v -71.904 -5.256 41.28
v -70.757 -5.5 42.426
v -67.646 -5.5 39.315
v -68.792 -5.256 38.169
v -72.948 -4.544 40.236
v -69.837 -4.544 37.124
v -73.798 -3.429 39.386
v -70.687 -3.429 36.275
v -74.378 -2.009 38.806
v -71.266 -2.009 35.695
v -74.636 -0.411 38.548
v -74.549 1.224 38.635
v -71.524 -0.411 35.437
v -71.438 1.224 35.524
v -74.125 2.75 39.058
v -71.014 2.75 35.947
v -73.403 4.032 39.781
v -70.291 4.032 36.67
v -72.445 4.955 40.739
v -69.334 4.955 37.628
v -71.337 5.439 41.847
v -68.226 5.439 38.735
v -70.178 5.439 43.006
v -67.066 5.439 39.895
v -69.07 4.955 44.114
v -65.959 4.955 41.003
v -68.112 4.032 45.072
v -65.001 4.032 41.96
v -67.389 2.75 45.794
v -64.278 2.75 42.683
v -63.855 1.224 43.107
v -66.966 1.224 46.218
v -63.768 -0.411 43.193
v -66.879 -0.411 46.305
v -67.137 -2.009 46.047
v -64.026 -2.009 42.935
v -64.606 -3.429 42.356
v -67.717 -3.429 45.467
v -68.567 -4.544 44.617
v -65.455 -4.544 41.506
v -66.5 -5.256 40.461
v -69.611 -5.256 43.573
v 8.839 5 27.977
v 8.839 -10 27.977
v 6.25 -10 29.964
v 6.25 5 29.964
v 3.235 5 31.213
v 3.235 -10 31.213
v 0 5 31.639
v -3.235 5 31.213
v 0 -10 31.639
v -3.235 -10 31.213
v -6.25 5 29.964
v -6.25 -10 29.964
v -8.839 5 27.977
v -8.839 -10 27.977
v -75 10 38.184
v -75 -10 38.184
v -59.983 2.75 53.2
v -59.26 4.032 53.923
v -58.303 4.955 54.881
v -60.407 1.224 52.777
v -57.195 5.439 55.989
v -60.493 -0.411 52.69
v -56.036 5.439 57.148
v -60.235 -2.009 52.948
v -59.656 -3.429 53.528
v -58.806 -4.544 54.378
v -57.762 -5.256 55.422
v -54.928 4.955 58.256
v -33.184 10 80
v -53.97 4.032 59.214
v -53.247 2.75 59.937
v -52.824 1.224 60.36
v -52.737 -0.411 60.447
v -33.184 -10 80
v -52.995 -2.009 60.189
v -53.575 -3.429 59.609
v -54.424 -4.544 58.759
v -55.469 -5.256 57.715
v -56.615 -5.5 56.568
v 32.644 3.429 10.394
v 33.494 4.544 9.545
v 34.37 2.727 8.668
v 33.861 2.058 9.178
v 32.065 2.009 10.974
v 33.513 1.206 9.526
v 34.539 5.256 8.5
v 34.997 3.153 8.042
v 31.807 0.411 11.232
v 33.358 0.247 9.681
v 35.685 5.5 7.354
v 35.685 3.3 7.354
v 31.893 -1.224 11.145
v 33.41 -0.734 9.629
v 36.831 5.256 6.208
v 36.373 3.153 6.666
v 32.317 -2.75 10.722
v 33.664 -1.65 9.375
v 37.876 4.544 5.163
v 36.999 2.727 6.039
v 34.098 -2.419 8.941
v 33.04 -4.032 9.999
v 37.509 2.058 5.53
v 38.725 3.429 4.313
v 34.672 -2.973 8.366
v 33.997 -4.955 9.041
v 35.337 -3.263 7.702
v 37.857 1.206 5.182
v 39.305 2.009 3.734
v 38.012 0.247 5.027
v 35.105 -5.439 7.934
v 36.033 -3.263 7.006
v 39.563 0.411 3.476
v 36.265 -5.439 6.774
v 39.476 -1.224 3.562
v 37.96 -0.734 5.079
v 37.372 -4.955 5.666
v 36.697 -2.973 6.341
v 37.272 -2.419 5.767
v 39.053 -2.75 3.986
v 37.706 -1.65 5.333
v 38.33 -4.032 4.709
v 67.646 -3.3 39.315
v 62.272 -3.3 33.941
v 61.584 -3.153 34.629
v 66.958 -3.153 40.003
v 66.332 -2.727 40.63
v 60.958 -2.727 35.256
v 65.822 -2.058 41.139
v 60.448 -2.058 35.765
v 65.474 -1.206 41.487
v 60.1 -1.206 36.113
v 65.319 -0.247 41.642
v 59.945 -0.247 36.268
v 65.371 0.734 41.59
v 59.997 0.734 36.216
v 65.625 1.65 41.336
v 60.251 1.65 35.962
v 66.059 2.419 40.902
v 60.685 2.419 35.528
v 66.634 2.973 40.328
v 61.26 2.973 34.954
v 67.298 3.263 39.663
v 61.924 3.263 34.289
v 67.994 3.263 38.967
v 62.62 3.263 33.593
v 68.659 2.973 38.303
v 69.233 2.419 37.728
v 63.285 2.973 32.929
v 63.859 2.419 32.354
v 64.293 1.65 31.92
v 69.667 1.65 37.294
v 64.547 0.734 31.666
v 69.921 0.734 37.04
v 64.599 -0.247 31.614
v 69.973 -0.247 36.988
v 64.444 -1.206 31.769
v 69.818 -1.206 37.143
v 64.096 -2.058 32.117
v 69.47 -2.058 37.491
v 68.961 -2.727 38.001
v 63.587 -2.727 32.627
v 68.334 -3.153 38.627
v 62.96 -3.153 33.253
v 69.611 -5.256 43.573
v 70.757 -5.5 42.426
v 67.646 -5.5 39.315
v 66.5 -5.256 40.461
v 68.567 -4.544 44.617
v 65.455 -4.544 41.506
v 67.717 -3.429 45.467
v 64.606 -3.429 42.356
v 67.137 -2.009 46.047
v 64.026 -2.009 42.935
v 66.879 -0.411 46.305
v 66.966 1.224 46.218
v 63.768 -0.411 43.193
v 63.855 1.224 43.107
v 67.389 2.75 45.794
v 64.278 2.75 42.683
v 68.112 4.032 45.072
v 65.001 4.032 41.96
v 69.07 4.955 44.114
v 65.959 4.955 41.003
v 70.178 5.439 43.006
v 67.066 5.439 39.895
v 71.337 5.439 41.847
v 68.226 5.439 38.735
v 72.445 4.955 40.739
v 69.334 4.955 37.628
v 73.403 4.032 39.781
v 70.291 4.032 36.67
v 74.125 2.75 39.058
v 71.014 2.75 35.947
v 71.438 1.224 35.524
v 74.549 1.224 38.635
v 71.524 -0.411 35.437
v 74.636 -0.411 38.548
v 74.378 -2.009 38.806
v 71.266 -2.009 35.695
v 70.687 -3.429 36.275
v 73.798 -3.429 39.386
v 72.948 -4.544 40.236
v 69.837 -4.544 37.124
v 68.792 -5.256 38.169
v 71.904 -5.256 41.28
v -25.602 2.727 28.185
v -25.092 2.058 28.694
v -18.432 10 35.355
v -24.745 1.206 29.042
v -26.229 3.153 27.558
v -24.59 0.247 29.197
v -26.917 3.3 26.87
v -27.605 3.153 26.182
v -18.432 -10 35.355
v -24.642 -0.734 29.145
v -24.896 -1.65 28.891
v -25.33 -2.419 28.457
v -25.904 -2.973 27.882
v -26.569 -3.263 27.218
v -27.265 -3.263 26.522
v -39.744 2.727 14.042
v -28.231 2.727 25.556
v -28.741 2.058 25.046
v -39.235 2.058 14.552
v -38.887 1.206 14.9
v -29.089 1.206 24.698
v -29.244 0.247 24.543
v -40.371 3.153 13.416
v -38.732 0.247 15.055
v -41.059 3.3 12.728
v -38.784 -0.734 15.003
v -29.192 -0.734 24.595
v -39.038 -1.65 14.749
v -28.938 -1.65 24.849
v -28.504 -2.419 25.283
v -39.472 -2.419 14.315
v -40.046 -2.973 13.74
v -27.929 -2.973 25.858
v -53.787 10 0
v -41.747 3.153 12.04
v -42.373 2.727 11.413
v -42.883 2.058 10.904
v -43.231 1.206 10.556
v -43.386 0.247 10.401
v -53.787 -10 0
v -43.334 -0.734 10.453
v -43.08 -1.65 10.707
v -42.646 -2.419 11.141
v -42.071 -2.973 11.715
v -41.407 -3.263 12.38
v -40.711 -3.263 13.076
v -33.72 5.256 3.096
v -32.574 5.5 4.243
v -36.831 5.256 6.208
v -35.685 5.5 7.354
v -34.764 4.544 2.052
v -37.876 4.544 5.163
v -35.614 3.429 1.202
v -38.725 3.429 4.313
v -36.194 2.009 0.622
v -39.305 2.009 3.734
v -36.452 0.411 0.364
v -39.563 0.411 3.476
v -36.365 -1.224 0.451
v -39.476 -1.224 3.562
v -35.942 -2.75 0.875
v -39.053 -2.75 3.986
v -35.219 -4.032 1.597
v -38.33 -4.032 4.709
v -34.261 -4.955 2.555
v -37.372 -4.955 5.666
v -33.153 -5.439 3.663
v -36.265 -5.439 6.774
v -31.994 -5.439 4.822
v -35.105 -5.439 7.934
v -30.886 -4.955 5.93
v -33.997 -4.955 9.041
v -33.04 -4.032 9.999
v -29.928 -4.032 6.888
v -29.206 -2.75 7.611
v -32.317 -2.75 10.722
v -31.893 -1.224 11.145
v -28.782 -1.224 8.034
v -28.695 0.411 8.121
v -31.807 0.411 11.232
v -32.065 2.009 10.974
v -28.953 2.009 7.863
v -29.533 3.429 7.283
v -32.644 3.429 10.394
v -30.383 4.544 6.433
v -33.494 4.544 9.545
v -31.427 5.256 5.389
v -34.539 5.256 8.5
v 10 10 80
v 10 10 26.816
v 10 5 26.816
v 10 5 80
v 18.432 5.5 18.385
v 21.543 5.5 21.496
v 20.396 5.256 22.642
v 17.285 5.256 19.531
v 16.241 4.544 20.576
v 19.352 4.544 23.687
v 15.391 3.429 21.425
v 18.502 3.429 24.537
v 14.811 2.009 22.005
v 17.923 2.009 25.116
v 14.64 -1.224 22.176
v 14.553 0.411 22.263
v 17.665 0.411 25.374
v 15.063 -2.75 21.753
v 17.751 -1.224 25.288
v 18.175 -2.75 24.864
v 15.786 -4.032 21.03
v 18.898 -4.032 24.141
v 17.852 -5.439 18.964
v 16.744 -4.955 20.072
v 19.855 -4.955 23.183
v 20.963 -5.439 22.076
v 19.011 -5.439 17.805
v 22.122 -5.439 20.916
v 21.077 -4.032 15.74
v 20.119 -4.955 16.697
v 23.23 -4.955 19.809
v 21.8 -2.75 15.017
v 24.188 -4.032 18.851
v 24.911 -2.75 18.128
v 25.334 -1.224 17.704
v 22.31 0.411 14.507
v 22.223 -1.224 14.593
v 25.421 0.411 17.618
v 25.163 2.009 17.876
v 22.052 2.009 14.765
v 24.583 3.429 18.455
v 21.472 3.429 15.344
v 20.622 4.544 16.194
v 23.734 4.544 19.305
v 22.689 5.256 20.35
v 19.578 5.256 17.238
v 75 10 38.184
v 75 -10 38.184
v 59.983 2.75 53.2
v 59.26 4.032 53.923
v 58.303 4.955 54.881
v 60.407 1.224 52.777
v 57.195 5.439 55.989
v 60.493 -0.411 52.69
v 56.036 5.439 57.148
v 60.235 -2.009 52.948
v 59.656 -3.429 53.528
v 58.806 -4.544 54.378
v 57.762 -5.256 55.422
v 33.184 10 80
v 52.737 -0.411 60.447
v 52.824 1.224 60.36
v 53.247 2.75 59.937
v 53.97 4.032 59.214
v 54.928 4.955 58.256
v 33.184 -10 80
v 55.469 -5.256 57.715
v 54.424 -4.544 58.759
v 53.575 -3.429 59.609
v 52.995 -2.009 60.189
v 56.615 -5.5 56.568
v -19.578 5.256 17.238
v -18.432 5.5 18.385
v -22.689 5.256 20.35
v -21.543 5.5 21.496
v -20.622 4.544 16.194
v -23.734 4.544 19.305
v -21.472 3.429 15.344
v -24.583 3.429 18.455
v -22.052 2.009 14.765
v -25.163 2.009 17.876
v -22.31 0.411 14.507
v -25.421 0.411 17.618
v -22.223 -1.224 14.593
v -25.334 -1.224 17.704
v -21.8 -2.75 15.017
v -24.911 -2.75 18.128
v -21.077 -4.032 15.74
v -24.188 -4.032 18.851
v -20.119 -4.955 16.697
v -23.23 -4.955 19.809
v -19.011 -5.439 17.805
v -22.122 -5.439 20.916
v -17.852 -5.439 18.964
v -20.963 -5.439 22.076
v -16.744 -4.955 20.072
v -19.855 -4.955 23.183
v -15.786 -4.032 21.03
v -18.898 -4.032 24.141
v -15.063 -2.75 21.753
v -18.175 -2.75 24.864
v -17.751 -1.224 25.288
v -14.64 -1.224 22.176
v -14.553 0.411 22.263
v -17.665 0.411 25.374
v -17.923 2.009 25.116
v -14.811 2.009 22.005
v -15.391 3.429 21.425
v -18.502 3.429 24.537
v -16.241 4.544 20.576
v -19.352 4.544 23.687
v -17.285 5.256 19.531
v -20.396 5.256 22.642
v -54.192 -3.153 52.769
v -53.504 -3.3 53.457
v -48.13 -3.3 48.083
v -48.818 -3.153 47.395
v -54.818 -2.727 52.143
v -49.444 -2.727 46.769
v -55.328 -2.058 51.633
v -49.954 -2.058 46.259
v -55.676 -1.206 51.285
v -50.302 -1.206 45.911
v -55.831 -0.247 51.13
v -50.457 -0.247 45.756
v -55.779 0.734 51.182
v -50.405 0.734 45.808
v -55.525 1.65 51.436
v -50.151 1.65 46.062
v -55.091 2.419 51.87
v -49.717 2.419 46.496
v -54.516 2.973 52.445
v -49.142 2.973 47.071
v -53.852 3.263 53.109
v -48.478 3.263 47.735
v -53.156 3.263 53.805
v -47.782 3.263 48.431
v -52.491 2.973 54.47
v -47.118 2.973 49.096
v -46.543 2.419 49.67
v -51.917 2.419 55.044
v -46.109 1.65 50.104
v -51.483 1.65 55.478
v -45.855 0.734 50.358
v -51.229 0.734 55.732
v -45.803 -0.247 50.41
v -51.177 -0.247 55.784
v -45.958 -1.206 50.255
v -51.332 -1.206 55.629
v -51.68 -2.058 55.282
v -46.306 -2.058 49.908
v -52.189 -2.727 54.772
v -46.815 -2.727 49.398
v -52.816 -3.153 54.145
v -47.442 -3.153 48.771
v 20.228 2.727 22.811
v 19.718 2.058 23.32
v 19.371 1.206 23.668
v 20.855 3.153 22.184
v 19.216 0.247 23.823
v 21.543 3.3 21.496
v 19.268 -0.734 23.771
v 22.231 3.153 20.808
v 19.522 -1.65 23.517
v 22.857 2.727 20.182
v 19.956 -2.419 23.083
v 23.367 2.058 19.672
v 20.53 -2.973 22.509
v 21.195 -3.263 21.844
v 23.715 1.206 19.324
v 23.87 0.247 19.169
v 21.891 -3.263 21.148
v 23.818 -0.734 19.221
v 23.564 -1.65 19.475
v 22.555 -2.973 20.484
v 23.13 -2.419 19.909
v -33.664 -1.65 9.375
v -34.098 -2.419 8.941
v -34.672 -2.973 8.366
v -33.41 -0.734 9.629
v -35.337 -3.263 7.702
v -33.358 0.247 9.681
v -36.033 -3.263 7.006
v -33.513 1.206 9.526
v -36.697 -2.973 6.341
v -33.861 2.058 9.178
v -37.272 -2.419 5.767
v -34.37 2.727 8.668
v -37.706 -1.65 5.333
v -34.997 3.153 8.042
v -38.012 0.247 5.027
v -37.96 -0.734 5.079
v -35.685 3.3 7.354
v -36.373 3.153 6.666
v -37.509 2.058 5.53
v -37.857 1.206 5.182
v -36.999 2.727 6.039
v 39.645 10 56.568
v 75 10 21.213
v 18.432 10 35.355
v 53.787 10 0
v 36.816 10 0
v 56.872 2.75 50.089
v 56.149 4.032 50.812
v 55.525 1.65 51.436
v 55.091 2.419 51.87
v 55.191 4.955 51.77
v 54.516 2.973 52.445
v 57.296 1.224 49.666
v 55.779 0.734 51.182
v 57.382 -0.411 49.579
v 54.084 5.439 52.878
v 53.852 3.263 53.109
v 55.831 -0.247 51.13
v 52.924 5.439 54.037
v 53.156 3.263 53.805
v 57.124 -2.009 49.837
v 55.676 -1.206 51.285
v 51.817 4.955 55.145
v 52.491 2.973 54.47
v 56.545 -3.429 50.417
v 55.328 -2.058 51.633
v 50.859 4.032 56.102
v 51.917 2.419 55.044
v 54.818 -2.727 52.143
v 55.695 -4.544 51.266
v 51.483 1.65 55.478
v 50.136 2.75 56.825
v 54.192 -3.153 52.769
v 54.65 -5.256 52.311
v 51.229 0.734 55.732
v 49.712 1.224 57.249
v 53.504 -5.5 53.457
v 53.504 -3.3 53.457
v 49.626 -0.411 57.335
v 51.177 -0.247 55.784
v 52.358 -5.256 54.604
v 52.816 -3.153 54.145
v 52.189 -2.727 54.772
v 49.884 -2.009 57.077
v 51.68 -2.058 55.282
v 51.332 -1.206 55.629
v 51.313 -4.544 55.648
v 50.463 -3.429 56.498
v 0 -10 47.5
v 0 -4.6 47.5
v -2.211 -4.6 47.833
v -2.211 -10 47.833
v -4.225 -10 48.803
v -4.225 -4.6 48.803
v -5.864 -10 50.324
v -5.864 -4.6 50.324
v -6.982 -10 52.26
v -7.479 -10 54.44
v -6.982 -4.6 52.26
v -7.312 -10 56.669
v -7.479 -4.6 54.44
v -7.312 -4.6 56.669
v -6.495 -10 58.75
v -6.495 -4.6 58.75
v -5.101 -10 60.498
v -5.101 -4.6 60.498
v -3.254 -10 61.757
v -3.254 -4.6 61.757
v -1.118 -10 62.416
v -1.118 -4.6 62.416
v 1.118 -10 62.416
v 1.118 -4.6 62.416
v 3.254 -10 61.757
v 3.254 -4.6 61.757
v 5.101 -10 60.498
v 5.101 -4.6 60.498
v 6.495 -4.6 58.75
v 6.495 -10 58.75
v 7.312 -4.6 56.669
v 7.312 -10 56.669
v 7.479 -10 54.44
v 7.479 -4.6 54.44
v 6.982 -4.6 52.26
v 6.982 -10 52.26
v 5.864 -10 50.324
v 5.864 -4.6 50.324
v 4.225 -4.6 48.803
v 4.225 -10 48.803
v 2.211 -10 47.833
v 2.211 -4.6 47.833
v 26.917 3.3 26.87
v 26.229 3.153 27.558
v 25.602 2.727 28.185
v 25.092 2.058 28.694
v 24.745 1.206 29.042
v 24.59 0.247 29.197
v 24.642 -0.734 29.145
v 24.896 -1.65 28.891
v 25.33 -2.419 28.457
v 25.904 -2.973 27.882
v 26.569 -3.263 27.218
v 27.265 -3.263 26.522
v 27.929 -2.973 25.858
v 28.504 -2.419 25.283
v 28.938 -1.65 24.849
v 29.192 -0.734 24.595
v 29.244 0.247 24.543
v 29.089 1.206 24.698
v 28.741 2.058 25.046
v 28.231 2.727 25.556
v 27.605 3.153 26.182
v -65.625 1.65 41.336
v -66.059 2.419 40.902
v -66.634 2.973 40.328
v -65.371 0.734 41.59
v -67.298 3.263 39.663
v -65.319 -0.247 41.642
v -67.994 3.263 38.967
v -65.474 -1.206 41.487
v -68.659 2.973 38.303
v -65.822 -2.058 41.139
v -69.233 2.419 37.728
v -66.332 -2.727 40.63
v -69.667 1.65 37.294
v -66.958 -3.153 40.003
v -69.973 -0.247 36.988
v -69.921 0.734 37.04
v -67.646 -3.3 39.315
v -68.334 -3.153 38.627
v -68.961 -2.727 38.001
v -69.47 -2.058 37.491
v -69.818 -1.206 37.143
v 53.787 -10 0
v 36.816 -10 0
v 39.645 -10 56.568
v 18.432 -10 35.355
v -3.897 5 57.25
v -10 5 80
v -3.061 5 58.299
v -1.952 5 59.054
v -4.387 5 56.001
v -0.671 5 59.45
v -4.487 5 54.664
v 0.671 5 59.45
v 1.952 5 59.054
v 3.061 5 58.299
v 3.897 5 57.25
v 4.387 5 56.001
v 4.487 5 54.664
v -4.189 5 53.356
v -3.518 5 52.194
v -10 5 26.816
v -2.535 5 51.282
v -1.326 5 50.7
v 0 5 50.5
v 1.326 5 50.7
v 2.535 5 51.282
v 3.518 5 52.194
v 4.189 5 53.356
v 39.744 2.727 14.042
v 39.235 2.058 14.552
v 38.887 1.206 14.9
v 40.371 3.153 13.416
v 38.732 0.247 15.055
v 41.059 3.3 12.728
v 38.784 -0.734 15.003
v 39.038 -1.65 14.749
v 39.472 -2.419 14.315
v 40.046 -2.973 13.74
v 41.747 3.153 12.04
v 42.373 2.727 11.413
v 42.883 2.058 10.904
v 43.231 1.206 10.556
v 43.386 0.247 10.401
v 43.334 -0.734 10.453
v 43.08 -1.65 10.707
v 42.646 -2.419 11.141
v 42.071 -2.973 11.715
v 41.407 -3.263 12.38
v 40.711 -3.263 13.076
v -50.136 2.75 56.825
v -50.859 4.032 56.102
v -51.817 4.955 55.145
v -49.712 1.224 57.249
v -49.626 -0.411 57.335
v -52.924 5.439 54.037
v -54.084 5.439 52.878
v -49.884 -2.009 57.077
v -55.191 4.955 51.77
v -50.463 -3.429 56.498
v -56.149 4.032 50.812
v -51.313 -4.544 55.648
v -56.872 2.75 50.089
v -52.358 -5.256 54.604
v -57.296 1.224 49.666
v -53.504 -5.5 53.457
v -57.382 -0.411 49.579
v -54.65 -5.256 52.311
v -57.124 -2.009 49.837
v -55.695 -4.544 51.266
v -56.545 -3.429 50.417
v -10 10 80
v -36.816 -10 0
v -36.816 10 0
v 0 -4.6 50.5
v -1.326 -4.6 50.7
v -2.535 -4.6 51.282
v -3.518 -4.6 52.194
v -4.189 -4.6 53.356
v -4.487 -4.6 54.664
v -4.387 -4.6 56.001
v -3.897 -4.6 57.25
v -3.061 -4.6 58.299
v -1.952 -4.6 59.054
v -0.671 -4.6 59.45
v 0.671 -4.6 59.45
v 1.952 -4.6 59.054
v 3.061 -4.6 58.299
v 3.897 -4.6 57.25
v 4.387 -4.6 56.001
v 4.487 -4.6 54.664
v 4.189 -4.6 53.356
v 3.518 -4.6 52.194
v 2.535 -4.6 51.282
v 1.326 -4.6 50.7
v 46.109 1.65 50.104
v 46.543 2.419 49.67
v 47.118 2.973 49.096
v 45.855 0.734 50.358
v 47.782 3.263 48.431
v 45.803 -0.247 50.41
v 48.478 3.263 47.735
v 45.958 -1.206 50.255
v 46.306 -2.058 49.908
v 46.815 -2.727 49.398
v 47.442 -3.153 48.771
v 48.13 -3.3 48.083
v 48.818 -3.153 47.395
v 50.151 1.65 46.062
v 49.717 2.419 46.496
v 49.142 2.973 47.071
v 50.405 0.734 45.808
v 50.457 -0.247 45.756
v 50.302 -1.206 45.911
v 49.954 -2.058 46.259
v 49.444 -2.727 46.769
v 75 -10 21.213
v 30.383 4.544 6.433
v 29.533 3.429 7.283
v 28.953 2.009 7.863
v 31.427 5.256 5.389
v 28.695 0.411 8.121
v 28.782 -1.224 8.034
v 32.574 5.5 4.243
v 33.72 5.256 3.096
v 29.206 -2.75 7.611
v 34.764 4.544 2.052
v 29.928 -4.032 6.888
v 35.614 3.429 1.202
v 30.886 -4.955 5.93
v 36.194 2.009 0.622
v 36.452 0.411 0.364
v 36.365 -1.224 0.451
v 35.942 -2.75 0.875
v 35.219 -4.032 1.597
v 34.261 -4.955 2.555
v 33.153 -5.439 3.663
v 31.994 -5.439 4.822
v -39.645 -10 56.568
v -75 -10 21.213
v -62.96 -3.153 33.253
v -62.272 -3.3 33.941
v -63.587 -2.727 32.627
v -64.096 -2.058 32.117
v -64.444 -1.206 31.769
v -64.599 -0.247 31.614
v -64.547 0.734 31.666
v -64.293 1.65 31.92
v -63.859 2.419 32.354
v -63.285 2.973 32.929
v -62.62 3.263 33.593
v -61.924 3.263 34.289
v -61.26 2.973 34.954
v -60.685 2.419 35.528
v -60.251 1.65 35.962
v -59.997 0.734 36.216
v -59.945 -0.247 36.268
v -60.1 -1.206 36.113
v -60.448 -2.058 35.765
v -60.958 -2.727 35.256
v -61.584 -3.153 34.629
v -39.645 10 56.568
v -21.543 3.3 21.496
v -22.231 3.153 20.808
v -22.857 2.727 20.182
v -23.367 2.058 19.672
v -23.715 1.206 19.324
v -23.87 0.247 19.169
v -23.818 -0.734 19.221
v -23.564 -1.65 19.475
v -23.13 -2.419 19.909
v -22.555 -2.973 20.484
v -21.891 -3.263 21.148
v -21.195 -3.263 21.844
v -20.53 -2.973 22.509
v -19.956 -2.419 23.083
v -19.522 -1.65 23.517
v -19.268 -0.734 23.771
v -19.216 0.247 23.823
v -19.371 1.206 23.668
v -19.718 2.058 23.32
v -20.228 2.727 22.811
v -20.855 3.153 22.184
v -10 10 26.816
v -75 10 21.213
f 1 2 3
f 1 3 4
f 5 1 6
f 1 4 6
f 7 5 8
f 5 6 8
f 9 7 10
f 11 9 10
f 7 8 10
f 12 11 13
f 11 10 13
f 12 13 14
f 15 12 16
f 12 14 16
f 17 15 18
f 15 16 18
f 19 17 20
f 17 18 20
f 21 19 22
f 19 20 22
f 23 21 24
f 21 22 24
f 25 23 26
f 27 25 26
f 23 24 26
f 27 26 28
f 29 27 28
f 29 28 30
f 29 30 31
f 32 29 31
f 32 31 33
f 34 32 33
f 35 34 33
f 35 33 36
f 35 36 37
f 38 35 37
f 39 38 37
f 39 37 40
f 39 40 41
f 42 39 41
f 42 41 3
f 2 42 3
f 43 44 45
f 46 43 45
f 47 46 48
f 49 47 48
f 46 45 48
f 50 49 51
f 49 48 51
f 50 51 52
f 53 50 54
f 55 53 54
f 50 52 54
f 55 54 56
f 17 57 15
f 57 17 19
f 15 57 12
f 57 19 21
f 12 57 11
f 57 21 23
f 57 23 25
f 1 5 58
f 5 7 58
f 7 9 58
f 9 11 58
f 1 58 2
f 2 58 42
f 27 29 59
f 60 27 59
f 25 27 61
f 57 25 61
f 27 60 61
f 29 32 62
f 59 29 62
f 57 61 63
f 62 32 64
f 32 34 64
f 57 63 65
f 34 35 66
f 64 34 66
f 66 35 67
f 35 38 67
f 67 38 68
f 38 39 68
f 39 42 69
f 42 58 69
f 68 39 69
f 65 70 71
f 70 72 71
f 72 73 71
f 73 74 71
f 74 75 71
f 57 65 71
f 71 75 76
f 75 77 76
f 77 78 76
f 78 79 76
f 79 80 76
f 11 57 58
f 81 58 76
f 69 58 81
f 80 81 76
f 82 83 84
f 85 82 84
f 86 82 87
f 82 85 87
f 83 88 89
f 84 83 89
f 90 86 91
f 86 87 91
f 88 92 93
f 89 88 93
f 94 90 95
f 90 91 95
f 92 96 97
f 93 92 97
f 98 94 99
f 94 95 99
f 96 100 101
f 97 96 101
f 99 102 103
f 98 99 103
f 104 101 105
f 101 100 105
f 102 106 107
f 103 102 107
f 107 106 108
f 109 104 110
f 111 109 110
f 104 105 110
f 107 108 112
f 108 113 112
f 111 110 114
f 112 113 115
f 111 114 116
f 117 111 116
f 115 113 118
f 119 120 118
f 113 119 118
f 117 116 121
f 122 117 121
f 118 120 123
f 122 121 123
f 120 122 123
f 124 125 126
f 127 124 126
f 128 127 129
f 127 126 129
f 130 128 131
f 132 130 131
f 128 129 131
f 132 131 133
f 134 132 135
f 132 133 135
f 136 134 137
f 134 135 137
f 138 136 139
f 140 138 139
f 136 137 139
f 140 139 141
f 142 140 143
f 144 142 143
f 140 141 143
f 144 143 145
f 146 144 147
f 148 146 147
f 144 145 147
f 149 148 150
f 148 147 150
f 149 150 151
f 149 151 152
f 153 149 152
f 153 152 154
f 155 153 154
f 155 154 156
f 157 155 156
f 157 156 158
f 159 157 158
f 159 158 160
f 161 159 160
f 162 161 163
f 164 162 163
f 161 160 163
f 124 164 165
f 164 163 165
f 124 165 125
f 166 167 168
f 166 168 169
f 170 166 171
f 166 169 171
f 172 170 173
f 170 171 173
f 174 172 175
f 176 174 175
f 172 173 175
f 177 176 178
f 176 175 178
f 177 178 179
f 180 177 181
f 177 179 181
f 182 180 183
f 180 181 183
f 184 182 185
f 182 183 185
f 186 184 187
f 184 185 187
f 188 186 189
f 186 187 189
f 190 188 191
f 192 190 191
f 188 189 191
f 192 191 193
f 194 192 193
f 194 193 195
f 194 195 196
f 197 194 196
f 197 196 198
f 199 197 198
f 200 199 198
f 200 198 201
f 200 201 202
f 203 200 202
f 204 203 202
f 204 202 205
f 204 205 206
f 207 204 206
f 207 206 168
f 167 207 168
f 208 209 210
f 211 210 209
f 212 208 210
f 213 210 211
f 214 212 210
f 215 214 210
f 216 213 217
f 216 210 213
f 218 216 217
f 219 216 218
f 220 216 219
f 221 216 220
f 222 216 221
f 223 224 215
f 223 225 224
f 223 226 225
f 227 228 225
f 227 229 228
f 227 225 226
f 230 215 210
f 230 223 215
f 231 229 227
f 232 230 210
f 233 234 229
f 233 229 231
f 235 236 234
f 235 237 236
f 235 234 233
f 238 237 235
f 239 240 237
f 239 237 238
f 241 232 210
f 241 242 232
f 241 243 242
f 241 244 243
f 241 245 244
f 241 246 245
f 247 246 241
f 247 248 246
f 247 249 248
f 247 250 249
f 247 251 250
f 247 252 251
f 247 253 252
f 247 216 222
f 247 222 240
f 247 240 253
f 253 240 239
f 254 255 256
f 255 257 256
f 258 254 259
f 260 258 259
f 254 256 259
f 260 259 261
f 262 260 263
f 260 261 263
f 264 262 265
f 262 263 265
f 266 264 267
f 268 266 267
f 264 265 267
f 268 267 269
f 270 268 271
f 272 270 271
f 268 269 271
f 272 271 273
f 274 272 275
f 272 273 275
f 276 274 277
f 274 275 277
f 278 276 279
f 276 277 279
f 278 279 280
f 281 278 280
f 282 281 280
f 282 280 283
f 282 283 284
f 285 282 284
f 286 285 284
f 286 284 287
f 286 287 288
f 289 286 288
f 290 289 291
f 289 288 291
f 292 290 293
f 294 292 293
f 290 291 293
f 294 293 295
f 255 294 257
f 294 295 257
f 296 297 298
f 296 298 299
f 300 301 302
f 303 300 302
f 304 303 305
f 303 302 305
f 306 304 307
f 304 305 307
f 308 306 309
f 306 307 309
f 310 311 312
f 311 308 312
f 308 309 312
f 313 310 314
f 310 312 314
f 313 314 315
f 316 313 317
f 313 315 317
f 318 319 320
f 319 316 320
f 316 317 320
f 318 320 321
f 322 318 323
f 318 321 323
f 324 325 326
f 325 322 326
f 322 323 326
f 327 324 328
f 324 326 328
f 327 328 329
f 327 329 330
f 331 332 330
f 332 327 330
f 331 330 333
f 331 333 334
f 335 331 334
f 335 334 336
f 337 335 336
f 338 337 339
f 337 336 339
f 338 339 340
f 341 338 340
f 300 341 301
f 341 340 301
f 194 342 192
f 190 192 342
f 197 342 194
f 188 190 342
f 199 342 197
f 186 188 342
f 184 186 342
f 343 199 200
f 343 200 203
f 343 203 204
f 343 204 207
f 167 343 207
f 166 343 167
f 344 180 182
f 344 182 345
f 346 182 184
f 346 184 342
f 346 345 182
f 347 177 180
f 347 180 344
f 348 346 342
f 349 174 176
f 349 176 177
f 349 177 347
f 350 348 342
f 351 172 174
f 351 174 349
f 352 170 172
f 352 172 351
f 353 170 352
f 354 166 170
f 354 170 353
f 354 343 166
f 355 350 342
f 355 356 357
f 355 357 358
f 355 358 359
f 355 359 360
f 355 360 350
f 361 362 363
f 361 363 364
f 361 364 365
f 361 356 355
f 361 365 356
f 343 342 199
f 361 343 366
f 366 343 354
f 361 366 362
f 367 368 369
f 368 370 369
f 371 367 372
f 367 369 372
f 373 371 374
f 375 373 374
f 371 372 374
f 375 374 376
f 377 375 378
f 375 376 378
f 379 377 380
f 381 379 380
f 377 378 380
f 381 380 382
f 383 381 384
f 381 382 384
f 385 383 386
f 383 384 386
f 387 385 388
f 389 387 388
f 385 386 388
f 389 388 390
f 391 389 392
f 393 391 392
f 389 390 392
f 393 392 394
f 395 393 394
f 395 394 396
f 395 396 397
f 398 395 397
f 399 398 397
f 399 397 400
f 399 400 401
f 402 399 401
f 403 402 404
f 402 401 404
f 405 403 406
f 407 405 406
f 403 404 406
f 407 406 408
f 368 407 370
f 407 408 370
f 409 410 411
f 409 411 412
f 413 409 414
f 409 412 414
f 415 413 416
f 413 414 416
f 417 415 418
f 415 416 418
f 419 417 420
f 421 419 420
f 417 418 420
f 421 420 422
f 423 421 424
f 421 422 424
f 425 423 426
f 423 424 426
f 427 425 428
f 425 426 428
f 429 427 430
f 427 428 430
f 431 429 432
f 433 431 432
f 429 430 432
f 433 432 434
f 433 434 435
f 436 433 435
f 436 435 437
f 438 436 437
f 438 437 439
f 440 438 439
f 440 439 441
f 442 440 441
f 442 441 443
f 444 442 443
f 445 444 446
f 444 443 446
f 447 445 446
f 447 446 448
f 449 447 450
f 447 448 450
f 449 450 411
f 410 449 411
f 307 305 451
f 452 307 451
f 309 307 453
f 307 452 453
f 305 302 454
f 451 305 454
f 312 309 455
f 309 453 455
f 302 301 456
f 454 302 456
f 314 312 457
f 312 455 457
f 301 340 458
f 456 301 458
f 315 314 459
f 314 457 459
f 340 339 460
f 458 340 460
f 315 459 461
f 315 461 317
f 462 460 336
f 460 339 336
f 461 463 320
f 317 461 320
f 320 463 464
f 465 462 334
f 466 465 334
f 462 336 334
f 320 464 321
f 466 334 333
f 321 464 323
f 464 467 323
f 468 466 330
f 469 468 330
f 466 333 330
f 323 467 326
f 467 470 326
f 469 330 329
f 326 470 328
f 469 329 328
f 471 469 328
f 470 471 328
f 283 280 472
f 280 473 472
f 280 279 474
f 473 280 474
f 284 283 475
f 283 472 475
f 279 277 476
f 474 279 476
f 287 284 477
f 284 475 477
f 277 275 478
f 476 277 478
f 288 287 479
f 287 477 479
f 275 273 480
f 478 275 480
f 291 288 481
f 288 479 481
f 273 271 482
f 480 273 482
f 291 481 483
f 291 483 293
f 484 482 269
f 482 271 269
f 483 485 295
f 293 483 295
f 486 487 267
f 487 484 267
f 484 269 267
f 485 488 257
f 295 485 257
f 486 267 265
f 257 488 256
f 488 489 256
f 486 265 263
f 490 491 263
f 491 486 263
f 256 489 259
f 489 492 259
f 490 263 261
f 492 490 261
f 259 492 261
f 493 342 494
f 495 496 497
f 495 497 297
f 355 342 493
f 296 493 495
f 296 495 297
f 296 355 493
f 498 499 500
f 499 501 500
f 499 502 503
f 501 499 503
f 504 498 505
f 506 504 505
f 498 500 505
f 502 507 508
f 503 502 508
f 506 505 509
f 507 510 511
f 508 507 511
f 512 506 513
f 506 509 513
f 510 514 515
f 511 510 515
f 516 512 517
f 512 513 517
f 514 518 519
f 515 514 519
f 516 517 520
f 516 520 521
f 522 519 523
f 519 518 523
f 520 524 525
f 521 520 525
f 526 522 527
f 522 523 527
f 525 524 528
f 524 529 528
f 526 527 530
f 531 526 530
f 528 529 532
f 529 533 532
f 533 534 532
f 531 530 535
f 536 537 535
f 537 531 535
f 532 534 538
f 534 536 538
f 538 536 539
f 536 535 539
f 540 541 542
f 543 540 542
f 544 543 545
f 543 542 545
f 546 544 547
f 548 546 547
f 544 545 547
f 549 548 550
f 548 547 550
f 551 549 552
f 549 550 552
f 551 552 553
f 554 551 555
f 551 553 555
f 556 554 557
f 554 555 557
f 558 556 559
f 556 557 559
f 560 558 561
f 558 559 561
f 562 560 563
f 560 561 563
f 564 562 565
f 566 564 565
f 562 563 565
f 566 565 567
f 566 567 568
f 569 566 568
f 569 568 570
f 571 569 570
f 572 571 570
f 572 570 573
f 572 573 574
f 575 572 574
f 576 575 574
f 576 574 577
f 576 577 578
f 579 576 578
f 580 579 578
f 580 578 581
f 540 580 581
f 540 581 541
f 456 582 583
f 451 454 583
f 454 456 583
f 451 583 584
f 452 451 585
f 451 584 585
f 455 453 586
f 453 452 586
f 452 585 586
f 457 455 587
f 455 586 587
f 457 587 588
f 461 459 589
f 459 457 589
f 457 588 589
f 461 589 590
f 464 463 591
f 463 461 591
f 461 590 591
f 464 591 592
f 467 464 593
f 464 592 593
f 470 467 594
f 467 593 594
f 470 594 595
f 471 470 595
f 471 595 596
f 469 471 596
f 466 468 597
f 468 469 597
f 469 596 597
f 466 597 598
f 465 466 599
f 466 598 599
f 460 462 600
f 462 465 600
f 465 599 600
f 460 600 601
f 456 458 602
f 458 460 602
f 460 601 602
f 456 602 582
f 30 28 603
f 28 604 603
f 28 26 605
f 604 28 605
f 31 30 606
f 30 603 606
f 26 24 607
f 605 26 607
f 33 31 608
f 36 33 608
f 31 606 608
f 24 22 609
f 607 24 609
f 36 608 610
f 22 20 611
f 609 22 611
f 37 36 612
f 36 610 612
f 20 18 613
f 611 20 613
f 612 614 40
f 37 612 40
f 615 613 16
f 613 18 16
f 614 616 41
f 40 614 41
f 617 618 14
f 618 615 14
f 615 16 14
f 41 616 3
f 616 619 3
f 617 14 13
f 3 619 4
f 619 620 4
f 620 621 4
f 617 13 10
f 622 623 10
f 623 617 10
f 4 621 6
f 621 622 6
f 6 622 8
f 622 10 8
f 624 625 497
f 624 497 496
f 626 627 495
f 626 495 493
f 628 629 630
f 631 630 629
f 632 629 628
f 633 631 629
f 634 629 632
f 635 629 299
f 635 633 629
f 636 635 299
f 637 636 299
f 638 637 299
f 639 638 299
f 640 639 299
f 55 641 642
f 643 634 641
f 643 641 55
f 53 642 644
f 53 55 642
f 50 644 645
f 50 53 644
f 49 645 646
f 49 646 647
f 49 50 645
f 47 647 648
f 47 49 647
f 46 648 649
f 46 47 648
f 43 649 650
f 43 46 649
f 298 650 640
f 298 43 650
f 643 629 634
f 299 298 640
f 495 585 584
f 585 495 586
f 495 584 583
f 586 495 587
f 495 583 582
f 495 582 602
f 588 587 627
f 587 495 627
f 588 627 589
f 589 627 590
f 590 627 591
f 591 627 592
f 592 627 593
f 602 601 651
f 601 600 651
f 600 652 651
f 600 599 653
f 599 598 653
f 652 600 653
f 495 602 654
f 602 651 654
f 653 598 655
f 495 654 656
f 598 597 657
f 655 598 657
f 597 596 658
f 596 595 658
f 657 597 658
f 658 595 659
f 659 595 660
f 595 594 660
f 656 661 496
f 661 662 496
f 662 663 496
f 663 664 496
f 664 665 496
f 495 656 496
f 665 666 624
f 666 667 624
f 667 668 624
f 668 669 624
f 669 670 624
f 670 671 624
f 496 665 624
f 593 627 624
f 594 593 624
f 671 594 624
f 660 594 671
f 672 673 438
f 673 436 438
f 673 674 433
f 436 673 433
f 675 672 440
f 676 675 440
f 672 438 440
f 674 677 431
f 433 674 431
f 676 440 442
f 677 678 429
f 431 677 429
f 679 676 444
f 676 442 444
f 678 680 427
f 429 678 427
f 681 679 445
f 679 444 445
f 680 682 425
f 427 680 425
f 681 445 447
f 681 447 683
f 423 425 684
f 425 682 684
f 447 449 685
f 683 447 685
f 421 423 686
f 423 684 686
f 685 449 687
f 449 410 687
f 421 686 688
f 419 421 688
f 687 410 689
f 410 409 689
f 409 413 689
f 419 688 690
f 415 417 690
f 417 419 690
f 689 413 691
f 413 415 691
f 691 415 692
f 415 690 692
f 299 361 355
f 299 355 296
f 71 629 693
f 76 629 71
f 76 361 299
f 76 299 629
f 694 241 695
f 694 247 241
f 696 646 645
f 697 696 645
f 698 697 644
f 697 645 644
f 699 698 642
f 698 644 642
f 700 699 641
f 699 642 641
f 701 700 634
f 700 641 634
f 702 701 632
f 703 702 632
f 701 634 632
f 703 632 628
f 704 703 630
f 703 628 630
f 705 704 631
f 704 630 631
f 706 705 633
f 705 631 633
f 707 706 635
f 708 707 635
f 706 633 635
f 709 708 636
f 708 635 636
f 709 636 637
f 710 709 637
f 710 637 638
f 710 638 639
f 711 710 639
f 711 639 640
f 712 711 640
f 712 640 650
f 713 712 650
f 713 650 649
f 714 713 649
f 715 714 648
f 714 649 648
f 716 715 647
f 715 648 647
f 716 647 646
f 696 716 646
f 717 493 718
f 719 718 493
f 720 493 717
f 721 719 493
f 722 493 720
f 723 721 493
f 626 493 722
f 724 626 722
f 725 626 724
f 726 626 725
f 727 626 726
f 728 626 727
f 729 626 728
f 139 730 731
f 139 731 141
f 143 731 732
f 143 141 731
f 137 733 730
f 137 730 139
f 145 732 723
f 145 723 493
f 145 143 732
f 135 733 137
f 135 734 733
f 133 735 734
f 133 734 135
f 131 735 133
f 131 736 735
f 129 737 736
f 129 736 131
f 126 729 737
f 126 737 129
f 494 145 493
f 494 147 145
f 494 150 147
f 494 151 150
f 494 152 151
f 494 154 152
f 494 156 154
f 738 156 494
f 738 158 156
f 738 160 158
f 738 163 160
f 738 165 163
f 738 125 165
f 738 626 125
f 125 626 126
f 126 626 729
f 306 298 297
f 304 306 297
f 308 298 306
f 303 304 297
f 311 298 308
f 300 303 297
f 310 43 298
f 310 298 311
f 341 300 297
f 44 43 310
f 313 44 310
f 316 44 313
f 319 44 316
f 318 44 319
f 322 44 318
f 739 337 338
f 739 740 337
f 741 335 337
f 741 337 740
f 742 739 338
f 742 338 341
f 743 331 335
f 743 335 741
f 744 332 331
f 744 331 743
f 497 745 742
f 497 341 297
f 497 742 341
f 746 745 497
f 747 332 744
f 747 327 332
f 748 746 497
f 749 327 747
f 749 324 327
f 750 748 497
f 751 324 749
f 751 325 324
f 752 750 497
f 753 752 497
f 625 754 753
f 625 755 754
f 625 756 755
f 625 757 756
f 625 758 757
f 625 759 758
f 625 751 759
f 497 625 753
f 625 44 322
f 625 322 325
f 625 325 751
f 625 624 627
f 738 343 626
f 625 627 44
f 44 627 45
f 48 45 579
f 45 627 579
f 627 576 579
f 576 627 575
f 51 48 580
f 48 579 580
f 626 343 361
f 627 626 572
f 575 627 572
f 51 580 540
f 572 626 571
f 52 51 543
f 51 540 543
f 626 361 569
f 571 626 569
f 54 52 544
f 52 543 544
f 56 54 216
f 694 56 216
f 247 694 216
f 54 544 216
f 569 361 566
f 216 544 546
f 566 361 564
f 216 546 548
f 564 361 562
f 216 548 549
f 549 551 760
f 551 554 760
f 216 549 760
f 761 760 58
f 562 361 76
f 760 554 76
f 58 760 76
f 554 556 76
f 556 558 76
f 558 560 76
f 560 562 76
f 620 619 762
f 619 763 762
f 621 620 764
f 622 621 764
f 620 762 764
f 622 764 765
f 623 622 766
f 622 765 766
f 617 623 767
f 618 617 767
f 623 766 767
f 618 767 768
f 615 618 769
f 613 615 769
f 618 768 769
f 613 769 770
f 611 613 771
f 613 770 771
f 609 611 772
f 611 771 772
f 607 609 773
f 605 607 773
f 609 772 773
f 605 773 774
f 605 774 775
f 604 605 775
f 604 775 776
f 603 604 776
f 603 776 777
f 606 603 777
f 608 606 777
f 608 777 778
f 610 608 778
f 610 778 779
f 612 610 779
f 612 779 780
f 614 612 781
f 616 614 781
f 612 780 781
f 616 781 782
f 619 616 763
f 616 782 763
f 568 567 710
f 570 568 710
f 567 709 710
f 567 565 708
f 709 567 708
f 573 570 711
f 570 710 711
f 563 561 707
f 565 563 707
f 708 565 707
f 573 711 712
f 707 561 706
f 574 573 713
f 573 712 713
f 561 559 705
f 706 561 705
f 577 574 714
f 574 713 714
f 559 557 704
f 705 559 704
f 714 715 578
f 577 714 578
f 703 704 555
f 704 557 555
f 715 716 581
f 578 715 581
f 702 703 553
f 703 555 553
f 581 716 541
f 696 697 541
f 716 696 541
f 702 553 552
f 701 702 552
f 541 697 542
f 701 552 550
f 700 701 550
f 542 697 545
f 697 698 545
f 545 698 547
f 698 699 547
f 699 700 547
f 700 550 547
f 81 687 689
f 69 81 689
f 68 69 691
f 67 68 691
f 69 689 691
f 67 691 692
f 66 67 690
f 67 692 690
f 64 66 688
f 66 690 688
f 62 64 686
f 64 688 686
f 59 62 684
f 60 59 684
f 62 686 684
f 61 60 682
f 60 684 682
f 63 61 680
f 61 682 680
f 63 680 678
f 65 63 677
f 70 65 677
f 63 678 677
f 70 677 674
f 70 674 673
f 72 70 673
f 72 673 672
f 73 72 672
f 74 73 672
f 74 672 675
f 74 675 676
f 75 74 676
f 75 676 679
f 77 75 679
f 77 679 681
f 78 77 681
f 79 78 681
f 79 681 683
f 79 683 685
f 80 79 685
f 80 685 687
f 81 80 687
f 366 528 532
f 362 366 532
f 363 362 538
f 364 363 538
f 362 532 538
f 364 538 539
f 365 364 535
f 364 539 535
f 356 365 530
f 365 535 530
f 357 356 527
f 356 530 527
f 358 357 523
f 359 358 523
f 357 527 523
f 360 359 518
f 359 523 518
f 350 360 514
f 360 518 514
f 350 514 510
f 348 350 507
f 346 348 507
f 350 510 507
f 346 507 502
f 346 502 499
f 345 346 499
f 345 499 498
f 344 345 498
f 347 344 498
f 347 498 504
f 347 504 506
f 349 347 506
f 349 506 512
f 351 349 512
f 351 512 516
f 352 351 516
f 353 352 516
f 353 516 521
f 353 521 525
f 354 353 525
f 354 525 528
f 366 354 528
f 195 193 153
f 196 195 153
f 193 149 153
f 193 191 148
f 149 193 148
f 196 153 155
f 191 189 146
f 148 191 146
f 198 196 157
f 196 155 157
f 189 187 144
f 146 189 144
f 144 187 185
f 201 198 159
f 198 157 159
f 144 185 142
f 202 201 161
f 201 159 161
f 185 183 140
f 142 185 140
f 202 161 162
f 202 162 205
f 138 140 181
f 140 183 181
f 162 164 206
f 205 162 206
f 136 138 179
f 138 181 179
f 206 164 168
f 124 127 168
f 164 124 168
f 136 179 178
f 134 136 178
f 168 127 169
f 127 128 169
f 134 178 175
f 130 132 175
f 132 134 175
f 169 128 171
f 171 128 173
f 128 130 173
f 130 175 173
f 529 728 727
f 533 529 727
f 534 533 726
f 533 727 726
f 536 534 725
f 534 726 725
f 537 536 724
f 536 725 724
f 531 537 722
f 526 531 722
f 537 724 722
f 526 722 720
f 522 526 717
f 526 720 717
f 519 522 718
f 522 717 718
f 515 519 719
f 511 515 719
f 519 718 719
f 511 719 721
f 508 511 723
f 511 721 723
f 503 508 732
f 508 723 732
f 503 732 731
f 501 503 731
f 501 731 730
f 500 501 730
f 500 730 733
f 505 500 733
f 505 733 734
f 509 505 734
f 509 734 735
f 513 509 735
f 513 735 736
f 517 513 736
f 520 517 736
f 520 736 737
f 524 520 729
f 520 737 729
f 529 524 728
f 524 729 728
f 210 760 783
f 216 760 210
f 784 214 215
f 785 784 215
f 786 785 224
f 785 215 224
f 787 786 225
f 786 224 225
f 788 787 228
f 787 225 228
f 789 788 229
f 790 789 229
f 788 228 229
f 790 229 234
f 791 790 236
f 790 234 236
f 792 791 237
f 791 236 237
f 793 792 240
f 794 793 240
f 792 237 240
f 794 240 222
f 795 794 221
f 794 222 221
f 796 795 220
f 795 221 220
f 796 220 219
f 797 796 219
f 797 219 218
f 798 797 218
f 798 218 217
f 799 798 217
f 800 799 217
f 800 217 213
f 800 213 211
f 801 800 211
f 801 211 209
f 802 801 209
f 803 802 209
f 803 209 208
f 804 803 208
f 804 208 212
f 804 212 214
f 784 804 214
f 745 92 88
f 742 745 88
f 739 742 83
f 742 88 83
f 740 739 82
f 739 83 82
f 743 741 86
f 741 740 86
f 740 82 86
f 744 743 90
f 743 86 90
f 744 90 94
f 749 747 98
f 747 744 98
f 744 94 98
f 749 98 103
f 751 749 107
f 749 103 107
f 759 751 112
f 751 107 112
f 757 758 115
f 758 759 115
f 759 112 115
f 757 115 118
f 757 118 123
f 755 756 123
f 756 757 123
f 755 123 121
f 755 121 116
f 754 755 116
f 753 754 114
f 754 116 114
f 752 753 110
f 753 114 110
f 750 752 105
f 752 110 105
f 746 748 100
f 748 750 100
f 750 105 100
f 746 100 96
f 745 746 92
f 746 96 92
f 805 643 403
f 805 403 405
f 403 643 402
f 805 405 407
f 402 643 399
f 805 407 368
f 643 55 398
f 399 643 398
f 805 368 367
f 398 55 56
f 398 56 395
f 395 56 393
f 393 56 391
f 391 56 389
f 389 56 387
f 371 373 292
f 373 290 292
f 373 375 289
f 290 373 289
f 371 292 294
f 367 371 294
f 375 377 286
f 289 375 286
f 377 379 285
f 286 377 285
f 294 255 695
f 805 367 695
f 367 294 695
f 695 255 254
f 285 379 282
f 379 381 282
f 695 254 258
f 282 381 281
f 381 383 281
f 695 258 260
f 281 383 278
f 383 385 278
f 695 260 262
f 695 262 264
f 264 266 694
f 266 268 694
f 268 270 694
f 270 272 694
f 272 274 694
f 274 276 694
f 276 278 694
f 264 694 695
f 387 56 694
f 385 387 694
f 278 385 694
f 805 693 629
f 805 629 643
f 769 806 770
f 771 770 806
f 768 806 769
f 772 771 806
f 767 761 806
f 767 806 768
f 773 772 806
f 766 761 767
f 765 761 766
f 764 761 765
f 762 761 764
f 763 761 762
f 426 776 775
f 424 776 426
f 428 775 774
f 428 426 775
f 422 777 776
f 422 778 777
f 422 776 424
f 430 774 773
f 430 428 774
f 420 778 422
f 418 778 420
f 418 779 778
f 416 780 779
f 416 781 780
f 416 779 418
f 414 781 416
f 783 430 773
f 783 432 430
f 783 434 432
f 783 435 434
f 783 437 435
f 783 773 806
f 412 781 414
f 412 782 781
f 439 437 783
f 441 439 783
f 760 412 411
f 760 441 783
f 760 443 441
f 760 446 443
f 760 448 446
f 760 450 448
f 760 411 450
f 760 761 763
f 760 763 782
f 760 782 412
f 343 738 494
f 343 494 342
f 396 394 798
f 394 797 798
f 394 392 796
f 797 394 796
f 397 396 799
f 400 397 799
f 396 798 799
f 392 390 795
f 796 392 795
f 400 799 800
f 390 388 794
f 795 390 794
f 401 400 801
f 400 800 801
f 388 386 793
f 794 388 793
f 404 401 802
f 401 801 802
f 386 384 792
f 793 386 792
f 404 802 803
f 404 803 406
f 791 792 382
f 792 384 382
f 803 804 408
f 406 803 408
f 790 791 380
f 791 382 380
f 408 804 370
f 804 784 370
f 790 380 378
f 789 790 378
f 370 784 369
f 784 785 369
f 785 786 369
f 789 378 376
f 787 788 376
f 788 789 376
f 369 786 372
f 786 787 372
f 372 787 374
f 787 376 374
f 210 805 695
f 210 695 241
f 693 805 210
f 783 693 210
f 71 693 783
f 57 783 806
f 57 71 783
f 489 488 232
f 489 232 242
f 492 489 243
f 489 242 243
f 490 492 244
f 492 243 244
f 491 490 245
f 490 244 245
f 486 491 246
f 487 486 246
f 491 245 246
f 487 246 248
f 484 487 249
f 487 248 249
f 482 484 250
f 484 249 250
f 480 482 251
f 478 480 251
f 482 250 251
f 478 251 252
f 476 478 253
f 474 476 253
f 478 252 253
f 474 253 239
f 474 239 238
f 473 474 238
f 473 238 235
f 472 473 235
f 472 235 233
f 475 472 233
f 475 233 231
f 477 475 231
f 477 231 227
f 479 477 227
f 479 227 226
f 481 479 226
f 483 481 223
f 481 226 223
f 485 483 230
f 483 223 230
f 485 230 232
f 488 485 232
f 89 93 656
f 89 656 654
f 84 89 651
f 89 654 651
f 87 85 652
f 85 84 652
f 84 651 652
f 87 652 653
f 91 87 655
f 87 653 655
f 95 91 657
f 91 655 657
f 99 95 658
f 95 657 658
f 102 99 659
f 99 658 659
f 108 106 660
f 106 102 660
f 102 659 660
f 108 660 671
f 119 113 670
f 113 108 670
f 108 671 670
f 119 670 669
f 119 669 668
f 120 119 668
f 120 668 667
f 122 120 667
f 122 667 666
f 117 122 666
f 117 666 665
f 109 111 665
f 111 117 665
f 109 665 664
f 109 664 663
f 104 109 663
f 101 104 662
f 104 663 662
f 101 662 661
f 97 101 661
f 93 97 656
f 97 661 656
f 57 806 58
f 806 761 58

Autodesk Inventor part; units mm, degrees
ref_plane "YZ Plane" through (0, 0, 0) normal (1, 0, 0) x (0, 1, 0)
ref_plane "XZ Plane" through (0, 0, 0) normal (0, 1, 0) x (-1, 0, 0)
sketch "Skizze1" plane through (0, 0, 0) normal (0, 1, 0) x (-1, 0, 0)
  line L0 (75, 0) -> (-5, 80) construction
  line L1 (5, 80) -> (-75, 0) construction
  line L2 (75, 21.2132) -> (39.6447, 56.5685)
  line L3 (39.6447, 56.5685) -> (18.4315, 35.3553)
  line L4 (18.4315, 35.3553) -> (53.7868, 0)
  line L5 (-18.4315, 35.3553) -> (-39.6447, 56.5685)
  line L6 (-39.6447, 56.5685) -> (-75, 21.2132)
  line L7 (-18.4315, 35.3553) -> (-53.7868, 0)
  line L8 (75, 38.1838) -> (33.1838, 80)
  line L9 (-75, 38.1838) -> (-33.1838, 80)
  line L10 (8.8388, 27.9774) -> (36.8162, 0)
  line L11 (-8.8388, 27.9774) -> (-36.8162, 0)
  arc A0 (8.8388, 27.9774) -> (-8.8388, 27.9774) centre (0, 19.1386) ccw
  line L12 (-33.1838, 80) -> (33.1838, 80)
  line L13 (53.7868, 0) -> (36.8162, 0)
  line L14 (-36.8162, 0) -> (-53.7868, 0)
  line L15 (-75, 21.2132) -> (-75, 38.1838)
  line L16 (75, 21.2132) -> (75, 38.1838)
  line L17 (0, -16) -> (0, 96) construction
  line L18 (-105, 0) -> (105, 0) construction
  line L19 (39.6447, 56.5685) -> (48.1299, 65.0538)
  point P0 (0, 36.8162)
  point P1 (0, 0)
  dimension "d11" = 30
  dimension "d12" = 50
  dimension "d16" = 12
  dimension "d17" = 12
  dimension "d18" = 12.5
  dimension "d19" = 80
  dimension "d20" = 150
  dimension "d21" = 45
extrude "Grundkörper" add sketch "Skizze1" along normal mid plane 20
sketch "Skizze2" plane through (0, 10, 0) normal (0, 1, 0) x (1, 0, 0)
  line L0 (0, 16) -> (0, -96) construction
  line L1 (-33.1838, -80) -> (33.1838, -80) construction
  line L2 (105, 0) -> (-105, 0) construction
  line L3 (10, -80) -> (-10, -80)
  line L4 (-10, -80) -> (-10, 0)
  line L5 (-10, 0) -> (10, 0)
  line L6 (10, 0) -> (10, -80)
  point P0 (0, 0)
  dimension "d25" = 20
extrude "NUT" cut sketch "Skizze2" against normal blind 5
sketch "Skizze4" plane through (0, -10, 0) normal (0, -1, 0) x (1, 0, 0)
  line L0 (0, 96) -> (0, -16) construction
  line L1 (33.1838, 80) -> (-33.1838, 80) construction
  point P0 (0, 0)
  point P1 (0, 55)
  dimension "d29" = 25
hole "DIN7984_M8_Bohrung" at (0, -10, 55) direction (0, 1, 0) diameter 9 end through all counterbore diameter 15 counterbore depth 5.4
ref_plane "Arbeitsebene_Bohrung" through (-29.0381, -10, 45.9619) normal (-0.7071068, 0, 0.7071068) x (0.7071068, 0, 0.7071068)
sketch "Skizze5" plane through (-33.1838, -10, 80) normal (-0.7071068, 0, 0.7071068) x (0.7071068, 0, 0.7071068)
  line L0 (-21.1371, 20) -> (-21.1371, 0) construction
  line L1 (-59.1371, 20) -> (-59.1371, 0) construction
  line L2 (-125.864, 10) -> (110.2244, 10) construction
  line L3 (-71.1371, 0) -> (-71.1371, 20) projected
  point P0 (-33.1041, 10)
  point P1 (-33.1371, 10)
  point P2 (-53.1371, 10)
  dimension "d37" = 20
  dimension "d39" = 18
hole "DIN7984_M6_Bohrung" at (-56.6152, 0, 56.5685) at (-70.7574, 0, 42.4264) direction (0.7071068, 0, -0.7071068) diameter 6.6 end up to surface counterbore diameter 11 counterbore depth 4.4
mirror "DIN7984_M6_Bohrung_Spiegelung:1" about plane through (-29.0381, -10, 45.9619) normal (-0.7071068, 0, 0.7071068) of "DIN7984_M6_Bohrung"
mirror "DIN7984_M6_Bohrung_Spiegelung:2" about plane through (0, 0, 0) normal (1, 0, 0) of "DIN7984_M6_Bohrung", "DIN7984_M6_Bohrung_Spiegelung:1"
equation "\"d17\" = d16"
properties part number "200-20-ROCKER-CONNECTOR-03" material "Aluminium 6061"
